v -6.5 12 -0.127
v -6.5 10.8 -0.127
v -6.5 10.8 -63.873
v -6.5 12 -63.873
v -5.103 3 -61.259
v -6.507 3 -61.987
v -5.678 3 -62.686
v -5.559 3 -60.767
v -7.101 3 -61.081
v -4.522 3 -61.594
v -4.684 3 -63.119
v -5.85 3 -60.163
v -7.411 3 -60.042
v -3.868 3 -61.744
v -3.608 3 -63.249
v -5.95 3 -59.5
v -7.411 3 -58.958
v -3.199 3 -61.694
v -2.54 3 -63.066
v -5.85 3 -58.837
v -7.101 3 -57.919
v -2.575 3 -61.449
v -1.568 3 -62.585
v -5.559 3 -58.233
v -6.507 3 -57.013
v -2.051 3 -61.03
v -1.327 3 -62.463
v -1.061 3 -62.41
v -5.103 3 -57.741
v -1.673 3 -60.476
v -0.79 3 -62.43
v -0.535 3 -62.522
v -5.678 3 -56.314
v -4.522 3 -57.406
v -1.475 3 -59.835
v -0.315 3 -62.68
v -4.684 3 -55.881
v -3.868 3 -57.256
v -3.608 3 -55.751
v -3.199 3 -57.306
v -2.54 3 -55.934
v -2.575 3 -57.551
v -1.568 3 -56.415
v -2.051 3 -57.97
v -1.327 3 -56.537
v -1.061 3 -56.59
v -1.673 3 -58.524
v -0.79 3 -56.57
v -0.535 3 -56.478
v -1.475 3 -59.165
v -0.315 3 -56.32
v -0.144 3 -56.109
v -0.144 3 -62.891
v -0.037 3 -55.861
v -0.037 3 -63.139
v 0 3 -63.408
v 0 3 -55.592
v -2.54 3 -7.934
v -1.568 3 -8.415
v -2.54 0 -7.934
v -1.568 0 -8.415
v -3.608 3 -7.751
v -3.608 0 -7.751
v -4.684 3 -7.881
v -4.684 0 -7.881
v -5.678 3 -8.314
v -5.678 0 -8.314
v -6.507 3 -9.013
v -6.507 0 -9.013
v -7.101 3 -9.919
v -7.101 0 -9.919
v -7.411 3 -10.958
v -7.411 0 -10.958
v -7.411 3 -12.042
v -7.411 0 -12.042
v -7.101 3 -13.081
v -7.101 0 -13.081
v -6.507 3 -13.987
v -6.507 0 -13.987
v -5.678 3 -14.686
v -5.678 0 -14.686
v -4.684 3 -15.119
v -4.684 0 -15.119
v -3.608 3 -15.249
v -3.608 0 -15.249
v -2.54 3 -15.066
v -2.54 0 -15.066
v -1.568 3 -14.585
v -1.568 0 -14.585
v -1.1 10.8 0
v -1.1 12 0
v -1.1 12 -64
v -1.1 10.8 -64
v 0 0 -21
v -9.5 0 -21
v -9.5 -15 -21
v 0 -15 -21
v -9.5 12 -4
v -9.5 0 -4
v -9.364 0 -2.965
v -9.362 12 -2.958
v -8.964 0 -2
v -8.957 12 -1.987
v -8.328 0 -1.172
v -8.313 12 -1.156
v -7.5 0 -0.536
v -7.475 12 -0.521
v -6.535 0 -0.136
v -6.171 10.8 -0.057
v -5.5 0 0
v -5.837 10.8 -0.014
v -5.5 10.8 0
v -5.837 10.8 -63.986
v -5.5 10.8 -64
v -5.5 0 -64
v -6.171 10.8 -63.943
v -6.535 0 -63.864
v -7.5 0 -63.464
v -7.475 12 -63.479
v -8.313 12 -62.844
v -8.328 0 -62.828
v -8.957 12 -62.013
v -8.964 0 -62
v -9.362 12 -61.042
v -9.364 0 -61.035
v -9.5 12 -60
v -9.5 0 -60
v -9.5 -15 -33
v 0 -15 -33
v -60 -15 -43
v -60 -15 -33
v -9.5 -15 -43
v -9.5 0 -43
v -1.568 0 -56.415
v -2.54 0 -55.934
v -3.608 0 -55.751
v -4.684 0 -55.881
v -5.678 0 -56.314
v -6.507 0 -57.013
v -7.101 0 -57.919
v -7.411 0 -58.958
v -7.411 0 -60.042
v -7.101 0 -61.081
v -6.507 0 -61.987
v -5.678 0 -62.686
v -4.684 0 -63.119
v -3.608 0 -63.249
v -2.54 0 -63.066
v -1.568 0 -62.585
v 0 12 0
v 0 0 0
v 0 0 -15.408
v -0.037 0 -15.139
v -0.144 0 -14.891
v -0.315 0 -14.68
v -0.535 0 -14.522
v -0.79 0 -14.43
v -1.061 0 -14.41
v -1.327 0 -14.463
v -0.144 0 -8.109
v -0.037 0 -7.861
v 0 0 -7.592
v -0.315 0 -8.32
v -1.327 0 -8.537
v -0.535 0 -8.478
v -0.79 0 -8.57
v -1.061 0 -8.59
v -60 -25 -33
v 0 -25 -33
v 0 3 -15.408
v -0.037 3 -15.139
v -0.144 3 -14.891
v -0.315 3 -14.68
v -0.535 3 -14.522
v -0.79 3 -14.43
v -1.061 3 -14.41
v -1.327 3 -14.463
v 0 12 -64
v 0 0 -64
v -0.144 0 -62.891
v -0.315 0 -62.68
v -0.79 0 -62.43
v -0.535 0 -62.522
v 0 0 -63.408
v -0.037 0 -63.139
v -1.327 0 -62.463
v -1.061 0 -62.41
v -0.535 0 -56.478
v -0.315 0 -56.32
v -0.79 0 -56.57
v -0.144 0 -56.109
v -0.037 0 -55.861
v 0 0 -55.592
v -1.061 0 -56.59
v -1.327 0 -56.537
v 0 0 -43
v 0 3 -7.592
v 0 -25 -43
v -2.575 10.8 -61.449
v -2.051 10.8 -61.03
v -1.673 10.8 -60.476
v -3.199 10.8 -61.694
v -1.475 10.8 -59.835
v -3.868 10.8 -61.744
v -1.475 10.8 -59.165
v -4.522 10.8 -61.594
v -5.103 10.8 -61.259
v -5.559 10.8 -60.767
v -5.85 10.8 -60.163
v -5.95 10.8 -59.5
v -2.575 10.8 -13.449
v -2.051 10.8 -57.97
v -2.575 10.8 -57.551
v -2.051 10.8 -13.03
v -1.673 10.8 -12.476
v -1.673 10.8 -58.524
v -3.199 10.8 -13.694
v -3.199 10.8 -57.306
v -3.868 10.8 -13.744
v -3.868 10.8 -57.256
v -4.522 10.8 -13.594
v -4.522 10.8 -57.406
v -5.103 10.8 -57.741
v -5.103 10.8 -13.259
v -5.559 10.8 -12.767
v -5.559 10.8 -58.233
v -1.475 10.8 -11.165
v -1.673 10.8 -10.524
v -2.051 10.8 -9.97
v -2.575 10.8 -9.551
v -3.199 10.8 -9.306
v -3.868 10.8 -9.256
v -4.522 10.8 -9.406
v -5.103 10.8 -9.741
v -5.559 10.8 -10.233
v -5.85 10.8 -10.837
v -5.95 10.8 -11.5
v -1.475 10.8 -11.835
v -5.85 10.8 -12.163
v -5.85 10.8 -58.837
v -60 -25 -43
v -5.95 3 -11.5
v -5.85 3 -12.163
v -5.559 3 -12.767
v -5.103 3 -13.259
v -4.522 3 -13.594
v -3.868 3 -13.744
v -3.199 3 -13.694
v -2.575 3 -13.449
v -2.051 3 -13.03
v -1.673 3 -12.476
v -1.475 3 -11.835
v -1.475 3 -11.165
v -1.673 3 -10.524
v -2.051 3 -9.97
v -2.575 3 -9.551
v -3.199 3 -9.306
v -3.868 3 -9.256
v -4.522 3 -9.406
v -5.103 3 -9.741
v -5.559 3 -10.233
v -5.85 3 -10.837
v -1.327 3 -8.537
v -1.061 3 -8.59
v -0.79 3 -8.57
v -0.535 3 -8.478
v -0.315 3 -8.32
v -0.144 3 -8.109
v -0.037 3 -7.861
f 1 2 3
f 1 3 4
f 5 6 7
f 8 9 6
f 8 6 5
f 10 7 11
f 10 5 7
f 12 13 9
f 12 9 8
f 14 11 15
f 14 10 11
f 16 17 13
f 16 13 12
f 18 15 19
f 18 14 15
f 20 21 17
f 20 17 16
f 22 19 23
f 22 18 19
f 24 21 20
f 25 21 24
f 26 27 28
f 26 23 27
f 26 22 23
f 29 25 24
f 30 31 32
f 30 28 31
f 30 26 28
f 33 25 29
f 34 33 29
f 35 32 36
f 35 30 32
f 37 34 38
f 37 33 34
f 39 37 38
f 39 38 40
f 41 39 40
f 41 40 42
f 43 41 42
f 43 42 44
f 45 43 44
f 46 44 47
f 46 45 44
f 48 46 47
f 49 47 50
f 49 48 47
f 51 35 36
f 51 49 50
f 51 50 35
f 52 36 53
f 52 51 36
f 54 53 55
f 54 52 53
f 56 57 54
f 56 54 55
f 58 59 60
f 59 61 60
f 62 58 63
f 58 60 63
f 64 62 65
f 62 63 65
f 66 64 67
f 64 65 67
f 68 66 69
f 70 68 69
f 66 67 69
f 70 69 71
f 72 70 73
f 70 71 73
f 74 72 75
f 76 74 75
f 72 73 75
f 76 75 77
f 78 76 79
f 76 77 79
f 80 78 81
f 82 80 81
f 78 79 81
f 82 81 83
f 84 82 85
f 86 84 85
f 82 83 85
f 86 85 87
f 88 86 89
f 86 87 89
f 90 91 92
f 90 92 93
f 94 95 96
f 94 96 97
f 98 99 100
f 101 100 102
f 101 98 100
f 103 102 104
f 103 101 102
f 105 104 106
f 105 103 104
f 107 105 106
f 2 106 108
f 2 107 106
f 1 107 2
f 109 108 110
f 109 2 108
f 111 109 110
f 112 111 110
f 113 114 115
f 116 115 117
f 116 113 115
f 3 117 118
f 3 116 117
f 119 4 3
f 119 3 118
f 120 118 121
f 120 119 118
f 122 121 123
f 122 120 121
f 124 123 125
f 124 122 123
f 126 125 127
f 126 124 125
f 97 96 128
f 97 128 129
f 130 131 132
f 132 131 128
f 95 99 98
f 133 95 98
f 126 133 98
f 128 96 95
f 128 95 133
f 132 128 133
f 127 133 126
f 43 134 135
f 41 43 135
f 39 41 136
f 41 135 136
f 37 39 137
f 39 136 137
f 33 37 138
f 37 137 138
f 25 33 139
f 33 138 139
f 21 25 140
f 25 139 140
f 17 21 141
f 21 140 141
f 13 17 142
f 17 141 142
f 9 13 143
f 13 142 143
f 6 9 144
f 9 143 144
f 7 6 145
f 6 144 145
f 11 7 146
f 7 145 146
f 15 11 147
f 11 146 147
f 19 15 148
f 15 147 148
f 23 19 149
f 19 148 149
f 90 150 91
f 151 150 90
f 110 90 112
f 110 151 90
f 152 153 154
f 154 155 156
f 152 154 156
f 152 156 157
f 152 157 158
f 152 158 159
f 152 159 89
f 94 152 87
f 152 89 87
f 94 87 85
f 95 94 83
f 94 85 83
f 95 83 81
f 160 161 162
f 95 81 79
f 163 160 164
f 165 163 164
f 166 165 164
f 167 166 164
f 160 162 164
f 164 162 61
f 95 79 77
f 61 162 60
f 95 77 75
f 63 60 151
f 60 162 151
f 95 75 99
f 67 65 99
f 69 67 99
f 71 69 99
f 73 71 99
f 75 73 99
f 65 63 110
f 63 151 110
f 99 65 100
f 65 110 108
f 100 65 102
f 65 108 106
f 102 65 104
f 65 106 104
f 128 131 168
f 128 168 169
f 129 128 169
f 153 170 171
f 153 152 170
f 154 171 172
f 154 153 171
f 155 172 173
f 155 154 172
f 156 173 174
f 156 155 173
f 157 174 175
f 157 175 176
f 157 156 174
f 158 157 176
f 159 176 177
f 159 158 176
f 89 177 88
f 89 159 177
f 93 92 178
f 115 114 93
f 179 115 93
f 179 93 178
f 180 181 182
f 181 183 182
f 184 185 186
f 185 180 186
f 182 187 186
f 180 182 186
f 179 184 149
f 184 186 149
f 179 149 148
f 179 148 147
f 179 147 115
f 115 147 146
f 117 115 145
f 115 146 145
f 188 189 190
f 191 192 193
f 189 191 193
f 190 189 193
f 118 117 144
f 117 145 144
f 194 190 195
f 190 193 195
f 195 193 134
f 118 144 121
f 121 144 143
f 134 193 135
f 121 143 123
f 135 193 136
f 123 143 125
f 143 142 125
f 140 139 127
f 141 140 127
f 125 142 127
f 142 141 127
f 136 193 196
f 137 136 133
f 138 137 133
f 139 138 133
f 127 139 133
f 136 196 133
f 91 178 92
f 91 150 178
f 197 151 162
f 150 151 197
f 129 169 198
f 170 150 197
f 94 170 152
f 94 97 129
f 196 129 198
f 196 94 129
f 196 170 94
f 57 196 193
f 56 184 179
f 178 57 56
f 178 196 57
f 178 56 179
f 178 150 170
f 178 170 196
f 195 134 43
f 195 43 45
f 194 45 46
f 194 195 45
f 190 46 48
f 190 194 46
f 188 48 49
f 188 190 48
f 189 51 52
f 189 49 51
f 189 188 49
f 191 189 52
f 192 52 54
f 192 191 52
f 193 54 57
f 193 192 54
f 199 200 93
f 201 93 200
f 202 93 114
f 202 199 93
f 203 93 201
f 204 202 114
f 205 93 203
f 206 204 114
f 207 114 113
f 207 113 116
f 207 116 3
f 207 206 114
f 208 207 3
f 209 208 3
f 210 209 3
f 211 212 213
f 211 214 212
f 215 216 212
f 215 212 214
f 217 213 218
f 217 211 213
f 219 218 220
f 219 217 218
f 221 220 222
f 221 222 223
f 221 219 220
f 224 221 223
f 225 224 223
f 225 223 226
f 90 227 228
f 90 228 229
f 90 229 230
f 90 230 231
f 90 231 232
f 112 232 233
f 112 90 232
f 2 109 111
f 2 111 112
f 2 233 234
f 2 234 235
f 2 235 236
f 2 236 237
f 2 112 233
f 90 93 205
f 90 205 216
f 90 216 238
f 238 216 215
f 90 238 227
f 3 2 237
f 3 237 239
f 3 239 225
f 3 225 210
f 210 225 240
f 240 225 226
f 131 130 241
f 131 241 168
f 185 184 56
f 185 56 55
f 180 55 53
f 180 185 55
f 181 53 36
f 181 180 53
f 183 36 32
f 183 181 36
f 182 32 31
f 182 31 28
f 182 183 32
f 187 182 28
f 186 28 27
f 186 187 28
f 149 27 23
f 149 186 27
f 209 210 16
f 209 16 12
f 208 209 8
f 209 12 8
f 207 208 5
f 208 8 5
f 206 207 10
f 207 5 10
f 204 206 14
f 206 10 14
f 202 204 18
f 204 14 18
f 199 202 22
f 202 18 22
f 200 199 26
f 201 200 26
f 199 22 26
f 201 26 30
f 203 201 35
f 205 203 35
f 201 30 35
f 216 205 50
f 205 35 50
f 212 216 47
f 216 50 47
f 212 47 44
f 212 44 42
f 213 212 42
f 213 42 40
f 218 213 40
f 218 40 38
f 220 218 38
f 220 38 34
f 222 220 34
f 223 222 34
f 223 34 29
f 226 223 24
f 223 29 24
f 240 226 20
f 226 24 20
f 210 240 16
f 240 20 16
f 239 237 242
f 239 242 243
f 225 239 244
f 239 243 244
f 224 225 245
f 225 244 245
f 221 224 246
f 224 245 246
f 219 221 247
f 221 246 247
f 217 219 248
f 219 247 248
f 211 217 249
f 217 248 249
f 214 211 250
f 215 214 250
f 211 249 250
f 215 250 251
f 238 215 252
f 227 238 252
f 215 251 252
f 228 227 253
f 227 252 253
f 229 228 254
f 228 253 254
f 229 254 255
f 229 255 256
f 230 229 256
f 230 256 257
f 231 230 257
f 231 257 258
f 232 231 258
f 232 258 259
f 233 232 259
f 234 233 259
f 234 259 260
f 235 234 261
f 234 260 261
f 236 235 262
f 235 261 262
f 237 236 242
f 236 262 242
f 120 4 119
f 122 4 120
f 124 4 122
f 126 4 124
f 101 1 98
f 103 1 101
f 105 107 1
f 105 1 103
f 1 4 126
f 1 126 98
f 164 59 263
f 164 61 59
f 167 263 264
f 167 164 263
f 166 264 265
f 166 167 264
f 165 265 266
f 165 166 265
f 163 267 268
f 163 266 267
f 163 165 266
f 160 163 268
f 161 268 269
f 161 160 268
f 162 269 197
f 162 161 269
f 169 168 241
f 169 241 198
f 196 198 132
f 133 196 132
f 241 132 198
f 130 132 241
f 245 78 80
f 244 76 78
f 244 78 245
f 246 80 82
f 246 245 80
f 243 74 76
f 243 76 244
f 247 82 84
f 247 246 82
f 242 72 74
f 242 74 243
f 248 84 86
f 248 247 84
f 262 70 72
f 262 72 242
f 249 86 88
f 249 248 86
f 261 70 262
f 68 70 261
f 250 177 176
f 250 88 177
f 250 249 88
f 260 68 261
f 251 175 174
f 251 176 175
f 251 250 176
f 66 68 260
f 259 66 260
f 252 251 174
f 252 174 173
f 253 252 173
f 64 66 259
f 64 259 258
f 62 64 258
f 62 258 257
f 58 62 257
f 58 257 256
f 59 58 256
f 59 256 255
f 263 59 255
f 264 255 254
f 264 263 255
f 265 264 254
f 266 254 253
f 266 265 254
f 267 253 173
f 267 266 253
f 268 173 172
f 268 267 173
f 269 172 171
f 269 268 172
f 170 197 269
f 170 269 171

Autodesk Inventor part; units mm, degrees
ref_plane "YZ Plane" through (0, 0, 0) normal (1, 0, 0) x (0, 1, 0)
ref_plane "XZ Plane" through (0, 0, 0) normal (0, 1, 0) x (-1, 0, 0)
ref_plane "XY Plane" through (0, 0, 0) normal (0, 0, 1) x (1, 0, 0)
sketch "Sketch1" plane through (0, 0, 0) normal (0, 1, 0) x (-1, 0, 0)
  line L0 (0, 0) -> (9.5, 0)
  line L1 (9.5, 0) -> (9.5, -64)
  line L2 (9.5, -64) -> (0, -64)
  line L3 (0, -64) -> (0, 0)
  circle A0 centre (3.7, -11.5) radius 2.25
  circle A1 centre (3.7, -59.5) radius 2.25
  line L4 (3.7, -11.5) -> (3.7, -59.5) construction
  dimension "d1" = 9.5
  dimension "d2" = 64
  dimension "d3" = 4.5
  dimension "d4" = 48
  dimension "d6" = 3.7
  dimension "d17" = 4.5
extrude "Extrusion1" add sketch "Sketch1" along normal blind 12
sketch "Sketch2" plane through (-9.5, 0, 0) normal (0, 0, 1) x (1, 0, 0)
  line L0 (9.5, 12) -> (0, 12) projected
  line L1 (3, 12) -> (8.4, 12)
  line L2 (8.4, 12) -> (8.4, 10.8)
  line L3 (8.4, 10.8) -> (3, 10.8)
  line L4 (3, 10.8) -> (3, 12)
  line L5 (9.5, 0) -> (9.5, 12) projected
  line L6 (3.55, 0) -> (8.05, 0) projected
  line L7 (3.55, 12) -> (8.05, 12) projected
  line L8 (9.5, 0) -> (9.5, 12) projected
  line L9 (9.5, 0) -> (9.5, 12) projected
  line L10 (3.55, 12) -> (8.05, 12) projected
  line L11 (3.55, 12) -> (3.55, 0) projected
  line L12 (3.55, 12) -> (8.05, 12) projected
  line L13 (3.55, 0) -> (8.05, 0) projected
  line L14 (3.55, 12) -> (8.05, 12) projected
  line L15 (3.55, 0) -> (8.05, 0) projected
  line L16 (3.55, 12) -> (8.05, 12) projected
  line L17 (3.55, 0) -> (8.05, 0) projected
  dimension "d9" = 1.1
  dimension "d10" = 5.4
  dimension "d11" = 1.2
  dimension "d76" = 12
extrude "Extrusion2" cut sketch "Sketch2" against normal up to next
sketch "Sketch3" plane through (0, 0, 0) normal (0, -1, 0) x (1, 0, 0)
  circle A0 centre (-3.7, -11.5) radius 2.25 projected
  circle A1 centre (-3.7, -11.5) radius 3.75
  circle A2 centre (-3.7, -59.5) radius 2.25 projected
  circle A3 centre (-3.7, -59.5) radius 3.75
  point P0 (0, 0)
  dimension "d14" = 7.5
extrude "Extrusion3" cut sketch "Sketch3" against normal blind 3
fillet "Fillet1" radius 1 4 edges at (0, 1.5, -58.8897) (0, 1.5, -60.1103) (0, 1.5, -10.8897) (0, 1.5, -12.1103)
fillet "Fillet2" radius 4 2 edges at (-9.5, 6, -64) (-9.5, 6, 0)
sketch "Sketch15" plane through (0, 0, 0) normal (0, -1, 0) x (1, 0, 0)
  line L0 (0, 0) -> (0, -7.592) projected
  line L1 (-9.5, -32) -> (-9.5, -21)
  line L2 (-9.5, -21) -> (0, -21)
  line L3 (0, -21) -> (0, -43)
  line L4 (0, -43) -> (-9.5, -43)
  line L5 (-9.5, -43) -> (-9.5, -32)
  dimension "d79" = 11
  dimension "d80" = 22
extrude "Extrusion15" add sketch "Sketch15" along normal blind 15
sketch "Sketch16" plane through (0, -15, 0) normal (0, -1, 0) x (1, 0, 0)
  line L0 (-9.5, -43) -> (0, -43) projected
  line L1 (0, -43) -> (-60, -43)
  line L2 (-60, -43) -> (-60, -33)
  line L3 (-60, -33) -> (0, -33)
  line L4 (0, -33) -> (0, -43)
  point P0 (0, 0)
  dimension "d83" = 60
  dimension "d84" = 10
  dimension "d85" = 60
extrude "Extrusion16" add sketch "Sketch16" along normal blind 10
properties part number "Back_base"
